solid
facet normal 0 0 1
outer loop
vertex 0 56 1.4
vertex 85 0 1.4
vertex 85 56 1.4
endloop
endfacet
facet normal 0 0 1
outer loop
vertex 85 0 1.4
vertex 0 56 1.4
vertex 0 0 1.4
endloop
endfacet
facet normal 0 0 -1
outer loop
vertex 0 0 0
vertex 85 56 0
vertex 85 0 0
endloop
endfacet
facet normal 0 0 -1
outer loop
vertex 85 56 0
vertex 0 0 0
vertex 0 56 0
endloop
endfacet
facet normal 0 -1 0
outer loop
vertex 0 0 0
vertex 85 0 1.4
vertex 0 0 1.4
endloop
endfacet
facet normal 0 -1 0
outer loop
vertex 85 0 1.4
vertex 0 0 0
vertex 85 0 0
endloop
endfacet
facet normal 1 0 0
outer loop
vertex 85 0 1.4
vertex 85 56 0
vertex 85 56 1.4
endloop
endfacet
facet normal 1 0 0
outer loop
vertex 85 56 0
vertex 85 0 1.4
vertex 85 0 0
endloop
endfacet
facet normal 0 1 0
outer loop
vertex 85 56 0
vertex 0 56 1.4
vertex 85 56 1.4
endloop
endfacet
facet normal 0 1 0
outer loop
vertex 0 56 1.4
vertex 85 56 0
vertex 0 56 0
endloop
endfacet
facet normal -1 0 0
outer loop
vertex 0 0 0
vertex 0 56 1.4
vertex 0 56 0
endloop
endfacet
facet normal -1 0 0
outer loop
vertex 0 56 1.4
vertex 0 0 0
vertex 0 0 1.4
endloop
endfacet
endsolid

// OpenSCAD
$fn = 64;

board_length = 85.0;
board_width  = 56.0;
board_thick  = 1.4;

cube([board_length, board_width, board_thick], center=false);
